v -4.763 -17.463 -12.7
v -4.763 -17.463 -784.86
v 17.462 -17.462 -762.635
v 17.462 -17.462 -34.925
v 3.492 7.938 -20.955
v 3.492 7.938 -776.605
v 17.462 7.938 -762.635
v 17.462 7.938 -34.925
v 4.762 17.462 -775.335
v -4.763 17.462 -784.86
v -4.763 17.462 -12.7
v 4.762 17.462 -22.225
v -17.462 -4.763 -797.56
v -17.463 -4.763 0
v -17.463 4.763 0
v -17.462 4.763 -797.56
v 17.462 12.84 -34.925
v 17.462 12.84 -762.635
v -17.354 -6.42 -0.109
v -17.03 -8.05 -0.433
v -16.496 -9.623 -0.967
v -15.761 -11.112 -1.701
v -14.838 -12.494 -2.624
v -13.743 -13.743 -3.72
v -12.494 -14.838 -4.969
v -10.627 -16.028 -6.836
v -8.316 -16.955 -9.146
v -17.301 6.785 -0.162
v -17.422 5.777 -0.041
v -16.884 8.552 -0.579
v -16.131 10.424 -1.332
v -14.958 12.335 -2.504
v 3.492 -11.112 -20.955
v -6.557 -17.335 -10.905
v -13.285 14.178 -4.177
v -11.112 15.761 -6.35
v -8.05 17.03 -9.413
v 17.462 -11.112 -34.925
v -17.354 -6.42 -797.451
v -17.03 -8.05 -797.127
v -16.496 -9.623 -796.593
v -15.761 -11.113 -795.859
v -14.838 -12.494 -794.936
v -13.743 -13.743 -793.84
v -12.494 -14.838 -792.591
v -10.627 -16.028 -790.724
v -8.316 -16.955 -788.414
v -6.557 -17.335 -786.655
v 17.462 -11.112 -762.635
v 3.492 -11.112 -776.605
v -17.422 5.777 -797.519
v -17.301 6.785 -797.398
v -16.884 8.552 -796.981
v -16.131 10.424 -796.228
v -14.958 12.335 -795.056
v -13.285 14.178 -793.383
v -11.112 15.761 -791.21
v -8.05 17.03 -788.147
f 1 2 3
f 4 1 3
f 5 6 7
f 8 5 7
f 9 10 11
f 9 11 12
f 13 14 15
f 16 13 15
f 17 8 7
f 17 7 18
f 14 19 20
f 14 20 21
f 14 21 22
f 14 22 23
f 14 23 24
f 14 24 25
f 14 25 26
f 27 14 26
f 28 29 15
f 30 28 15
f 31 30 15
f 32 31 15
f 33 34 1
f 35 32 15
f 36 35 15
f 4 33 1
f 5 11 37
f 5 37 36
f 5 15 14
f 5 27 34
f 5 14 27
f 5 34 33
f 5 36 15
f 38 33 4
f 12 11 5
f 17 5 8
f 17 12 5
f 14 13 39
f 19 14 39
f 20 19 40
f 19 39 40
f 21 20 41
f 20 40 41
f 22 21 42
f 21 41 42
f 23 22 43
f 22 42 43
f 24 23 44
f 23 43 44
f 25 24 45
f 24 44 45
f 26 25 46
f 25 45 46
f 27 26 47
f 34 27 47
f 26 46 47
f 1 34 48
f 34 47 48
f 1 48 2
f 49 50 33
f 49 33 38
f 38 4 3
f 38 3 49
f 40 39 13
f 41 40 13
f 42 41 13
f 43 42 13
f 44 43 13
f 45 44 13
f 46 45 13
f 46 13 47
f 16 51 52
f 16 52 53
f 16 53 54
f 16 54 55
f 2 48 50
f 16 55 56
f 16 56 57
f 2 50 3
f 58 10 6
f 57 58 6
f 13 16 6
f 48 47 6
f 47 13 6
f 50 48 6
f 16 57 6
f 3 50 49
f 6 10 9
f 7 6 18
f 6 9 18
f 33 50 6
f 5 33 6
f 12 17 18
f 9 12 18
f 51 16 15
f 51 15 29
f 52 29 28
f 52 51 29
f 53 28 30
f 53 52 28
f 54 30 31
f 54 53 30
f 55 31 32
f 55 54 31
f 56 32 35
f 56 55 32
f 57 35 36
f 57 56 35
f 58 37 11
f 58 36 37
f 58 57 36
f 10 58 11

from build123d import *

# Parameters (mm, degrees)
SKETCH1_W           = 34.925
SKETCH1_H           = 34.925
BOSS_EXTRUDE1_DEPTH = 1320.8
SKETCH2_W           = 13.97
SKETCH2_H           = 19.05
CUT_EXTRUDE1_DEPTH  = 1322.030854224
FILLET1_R           = 12.7
CHAMFER1_SIZE       = 12.7
CHAMFER1_SIZE2      = 4.622421975
CUT_EXTRUDE2_DEPTH  = 1322.377059938


with BuildPart() as part:
    # Sketch1 → Boss-Extrude1 (new body)
    with BuildSketch(Plane.XY):
        Rectangle(SKETCH1_W, SKETCH1_H)
    extrude(amount=-BOSS_EXTRUDE1_DEPTH)

    # Sketch2 → Cut-Extrude1 (cut, through all)
    with BuildSketch(Plane.XY):
        with Locations((10.4775, -1.5875)):
            Rectangle(SKETCH2_W, SKETCH2_H)
    extrude(amount=-CUT_EXTRUDE1_DEPTH, mode=Mode.SUBTRACT)

    # Fillet1
    fillet1_edges = [part.edges().sort_by_distance(p)[0] for p in [
        (-17.4625, -17.4625, -660.4),
        (-17.4625, 17.4625, -660.4),
    ]]
    fillet(fillet1_edges, radius=FILLET1_R)

    # Chamfer1
    chamfer1_edges = [part.edges().sort_by_distance(p)[0] for p in [
        (17.4625, 17.4625, -660.4),
    ]]
    chamfer1_side = [part.faces().sort_by_distance(p)[0] for p in [
        (6.35, 17.4625, -660.4),
    ]]
    chamfer(chamfer1_edges, length=CHAMFER1_SIZE, length2=CHAMFER1_SIZE2, reference=chamfer1_side[0])

    # Sketch3 → Cut-Extrude2 (cut, through all)
    with BuildSketch(Plane(origin=(0, 17.4625, 0), x_dir=(1, 0, 0), z_dir=(0, 1, 0))):
        Polygon((-17.4625, 0), (17.4625, 34.925), (17.4625, 0), align=None)
        Polygon((-17.4625, 797.56), (17.4625, 762.635), (17.4625, 1320.8), (-17.4625, 1320.8), align=None)
    extrude(amount=-CUT_EXTRUDE2_DEPTH, mode=Mode.SUBTRACT)


solid = part.part
